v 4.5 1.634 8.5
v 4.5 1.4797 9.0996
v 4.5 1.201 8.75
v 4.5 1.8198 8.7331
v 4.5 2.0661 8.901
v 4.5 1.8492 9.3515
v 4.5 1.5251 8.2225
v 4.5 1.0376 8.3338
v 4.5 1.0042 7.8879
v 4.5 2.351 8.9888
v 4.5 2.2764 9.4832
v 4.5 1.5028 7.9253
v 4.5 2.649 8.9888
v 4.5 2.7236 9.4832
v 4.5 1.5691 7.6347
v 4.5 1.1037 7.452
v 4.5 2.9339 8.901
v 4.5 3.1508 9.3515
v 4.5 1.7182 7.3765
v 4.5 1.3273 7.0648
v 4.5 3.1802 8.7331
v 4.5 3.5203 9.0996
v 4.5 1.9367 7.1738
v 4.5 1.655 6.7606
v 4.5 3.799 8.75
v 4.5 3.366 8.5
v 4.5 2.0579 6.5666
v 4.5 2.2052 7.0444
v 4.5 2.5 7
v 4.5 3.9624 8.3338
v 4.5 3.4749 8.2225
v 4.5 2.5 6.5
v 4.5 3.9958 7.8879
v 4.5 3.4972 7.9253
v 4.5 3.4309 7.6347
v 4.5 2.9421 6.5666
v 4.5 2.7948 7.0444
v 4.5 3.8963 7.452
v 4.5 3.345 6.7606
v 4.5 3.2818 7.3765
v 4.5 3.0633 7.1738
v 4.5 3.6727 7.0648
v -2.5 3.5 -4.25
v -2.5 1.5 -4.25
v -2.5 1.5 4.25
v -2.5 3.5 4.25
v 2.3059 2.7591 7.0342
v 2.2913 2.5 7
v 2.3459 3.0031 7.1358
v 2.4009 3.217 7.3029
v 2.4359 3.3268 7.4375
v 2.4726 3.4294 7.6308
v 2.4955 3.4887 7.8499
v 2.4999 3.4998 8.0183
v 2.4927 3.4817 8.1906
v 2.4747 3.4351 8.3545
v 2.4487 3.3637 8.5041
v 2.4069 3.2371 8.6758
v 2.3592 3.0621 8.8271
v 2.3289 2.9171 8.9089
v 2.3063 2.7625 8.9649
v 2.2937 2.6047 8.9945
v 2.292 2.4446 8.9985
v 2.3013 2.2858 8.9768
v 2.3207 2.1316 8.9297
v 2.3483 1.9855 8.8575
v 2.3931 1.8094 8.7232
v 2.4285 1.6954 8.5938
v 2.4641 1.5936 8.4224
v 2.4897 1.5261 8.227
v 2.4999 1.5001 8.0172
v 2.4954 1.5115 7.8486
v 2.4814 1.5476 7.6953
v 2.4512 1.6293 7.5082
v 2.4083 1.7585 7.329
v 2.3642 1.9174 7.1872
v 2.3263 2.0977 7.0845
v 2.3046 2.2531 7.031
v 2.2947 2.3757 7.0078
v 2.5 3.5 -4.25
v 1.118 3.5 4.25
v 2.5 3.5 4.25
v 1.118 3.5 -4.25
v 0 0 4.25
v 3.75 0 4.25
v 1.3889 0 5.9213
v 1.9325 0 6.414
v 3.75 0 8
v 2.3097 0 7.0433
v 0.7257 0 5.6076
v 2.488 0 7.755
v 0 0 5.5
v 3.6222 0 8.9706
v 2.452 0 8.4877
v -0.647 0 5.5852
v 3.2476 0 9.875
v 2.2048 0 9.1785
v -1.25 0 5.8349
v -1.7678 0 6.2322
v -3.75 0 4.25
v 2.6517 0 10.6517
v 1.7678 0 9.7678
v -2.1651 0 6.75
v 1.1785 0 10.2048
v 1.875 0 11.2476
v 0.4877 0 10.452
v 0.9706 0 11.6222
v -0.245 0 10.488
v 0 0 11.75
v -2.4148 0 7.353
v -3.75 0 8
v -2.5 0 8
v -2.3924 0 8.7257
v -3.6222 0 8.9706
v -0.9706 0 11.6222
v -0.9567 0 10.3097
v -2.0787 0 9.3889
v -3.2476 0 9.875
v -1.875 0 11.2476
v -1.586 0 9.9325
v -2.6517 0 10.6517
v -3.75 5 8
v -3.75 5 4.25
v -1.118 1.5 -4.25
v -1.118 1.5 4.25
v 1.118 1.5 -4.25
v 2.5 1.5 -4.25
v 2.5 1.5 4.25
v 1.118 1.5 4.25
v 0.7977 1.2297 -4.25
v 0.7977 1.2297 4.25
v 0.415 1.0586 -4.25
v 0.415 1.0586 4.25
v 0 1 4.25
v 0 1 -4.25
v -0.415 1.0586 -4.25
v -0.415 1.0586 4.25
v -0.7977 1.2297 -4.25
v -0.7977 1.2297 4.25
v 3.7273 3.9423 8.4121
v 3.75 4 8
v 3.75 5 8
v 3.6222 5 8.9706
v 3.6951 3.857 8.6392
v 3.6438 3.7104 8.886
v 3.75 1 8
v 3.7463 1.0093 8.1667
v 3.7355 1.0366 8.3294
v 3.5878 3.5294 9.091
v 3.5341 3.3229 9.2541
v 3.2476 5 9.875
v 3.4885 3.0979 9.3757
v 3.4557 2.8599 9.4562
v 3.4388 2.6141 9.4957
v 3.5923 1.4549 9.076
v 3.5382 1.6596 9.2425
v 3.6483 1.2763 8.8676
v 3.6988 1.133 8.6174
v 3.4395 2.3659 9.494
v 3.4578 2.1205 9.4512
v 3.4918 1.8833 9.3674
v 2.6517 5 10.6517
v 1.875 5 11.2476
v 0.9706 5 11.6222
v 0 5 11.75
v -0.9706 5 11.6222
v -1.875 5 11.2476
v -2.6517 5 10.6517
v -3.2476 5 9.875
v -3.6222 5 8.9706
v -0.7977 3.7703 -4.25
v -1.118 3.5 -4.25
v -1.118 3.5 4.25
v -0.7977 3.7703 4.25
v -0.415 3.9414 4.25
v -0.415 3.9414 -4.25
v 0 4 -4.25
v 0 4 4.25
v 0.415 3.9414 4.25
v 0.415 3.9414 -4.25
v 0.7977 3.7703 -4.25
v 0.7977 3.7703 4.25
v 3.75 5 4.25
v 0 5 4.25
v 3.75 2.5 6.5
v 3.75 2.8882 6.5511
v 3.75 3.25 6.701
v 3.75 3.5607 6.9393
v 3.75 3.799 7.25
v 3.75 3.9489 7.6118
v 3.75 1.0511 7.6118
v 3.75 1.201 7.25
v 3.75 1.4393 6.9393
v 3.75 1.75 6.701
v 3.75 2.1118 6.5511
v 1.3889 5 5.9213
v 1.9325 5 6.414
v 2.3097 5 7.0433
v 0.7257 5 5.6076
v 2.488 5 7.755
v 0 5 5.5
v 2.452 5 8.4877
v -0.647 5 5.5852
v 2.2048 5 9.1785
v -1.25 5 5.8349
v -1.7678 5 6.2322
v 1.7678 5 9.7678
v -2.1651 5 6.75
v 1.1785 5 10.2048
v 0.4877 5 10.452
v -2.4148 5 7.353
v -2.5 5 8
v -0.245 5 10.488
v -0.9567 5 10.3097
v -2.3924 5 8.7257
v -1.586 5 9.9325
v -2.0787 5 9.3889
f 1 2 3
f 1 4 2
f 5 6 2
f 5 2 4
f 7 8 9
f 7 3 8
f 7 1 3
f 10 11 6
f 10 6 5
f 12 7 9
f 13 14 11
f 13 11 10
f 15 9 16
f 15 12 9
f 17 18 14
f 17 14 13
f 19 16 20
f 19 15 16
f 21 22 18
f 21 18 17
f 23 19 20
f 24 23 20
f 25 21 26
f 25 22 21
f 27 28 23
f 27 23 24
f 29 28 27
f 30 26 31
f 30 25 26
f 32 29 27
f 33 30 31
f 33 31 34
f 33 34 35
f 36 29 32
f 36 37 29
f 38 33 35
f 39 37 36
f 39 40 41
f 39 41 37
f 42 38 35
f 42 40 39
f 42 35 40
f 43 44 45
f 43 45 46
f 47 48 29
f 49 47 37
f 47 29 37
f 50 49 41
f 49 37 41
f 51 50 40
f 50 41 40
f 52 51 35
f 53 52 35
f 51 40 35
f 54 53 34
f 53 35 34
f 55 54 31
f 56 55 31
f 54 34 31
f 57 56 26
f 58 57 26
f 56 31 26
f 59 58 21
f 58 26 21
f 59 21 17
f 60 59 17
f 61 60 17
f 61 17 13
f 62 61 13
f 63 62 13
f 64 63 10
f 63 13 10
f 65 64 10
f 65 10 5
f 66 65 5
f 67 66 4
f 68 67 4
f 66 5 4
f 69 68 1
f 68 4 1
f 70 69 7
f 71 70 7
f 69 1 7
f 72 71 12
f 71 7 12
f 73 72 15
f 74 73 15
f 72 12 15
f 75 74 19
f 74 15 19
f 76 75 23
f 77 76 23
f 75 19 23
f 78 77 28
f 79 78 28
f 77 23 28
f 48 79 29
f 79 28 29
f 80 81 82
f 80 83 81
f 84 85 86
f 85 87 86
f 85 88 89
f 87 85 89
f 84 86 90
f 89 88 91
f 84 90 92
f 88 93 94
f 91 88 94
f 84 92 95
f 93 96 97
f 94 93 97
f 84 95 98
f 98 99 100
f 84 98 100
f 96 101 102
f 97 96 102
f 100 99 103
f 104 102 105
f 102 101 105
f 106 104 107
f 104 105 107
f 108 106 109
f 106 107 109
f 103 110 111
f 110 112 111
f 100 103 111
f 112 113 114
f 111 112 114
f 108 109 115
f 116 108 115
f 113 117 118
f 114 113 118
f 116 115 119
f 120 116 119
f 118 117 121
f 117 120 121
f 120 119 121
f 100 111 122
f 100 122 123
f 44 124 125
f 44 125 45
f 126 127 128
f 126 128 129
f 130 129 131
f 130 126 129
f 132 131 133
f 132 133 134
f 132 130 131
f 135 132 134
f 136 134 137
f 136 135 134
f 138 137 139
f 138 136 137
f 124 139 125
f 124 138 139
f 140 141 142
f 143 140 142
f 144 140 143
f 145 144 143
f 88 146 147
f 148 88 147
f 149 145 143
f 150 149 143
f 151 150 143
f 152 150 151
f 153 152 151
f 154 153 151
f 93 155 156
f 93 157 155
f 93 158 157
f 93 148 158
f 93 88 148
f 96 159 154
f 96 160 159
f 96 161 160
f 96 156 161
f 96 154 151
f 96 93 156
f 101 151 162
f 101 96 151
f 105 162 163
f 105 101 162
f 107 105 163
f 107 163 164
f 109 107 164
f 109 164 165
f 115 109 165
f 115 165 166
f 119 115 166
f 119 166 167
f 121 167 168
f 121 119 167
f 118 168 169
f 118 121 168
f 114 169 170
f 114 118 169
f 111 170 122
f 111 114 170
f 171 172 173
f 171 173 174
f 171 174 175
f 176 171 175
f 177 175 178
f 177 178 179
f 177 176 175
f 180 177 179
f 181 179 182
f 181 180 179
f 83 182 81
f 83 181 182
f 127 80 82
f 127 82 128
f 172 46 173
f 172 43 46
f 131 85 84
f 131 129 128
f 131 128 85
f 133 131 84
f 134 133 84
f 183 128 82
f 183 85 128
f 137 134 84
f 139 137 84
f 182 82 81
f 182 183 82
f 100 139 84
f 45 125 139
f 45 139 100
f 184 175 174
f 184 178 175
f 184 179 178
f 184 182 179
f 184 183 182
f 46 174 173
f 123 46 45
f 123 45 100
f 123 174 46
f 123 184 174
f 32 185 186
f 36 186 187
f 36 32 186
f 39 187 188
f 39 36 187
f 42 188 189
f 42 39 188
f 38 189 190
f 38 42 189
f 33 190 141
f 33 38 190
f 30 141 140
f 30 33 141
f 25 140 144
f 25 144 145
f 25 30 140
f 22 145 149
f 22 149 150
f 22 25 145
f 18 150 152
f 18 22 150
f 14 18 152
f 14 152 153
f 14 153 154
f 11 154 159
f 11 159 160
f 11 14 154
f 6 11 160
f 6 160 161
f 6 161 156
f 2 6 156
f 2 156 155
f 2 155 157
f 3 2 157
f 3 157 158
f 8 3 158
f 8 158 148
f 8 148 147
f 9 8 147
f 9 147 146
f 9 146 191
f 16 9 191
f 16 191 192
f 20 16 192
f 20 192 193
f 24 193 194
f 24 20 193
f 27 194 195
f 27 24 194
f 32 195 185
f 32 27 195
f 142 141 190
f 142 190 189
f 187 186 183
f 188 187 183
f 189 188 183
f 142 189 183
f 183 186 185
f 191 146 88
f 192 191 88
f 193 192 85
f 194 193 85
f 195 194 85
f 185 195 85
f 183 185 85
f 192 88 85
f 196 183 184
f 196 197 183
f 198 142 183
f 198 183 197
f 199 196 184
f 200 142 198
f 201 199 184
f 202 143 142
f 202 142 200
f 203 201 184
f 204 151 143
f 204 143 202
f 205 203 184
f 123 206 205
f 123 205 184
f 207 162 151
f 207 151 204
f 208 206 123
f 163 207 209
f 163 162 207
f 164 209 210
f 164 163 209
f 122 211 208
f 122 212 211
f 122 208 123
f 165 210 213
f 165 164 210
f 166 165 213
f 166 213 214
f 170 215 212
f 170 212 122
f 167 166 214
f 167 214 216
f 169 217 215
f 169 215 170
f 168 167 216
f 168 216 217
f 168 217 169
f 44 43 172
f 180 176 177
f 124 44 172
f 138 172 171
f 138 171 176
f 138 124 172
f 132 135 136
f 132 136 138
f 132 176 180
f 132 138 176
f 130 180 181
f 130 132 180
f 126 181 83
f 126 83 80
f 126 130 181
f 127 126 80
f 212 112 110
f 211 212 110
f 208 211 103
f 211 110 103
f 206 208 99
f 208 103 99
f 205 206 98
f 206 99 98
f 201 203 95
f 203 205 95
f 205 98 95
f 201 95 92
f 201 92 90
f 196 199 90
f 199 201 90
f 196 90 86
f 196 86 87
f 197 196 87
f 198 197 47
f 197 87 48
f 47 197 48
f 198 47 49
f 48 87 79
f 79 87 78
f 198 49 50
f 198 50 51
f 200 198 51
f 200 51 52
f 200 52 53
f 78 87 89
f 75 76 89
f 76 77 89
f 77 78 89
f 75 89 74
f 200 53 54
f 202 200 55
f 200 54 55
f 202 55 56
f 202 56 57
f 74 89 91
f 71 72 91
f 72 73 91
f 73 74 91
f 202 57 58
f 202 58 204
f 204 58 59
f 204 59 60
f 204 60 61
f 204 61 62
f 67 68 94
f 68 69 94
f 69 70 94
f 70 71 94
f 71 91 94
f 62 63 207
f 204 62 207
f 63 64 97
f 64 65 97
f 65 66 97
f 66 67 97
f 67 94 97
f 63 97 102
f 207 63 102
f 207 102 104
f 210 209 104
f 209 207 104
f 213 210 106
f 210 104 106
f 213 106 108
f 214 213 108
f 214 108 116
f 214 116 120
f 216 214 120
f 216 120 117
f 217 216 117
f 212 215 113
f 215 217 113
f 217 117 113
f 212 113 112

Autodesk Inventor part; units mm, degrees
ref_plane "YZ Plane" through (0, 0, 0) normal (1, 0, 0) x (0, 1, 0)
ref_plane "XZ Plane" through (0, 0, 0) normal (0, 1, 0) x (-1, 0, 0)
ref_plane "XY Plane" through (0, 0, 0) normal (0, 0, 1) x (1, 0, 0)
sketch "Sketch1" plane through (0, 0, 0) normal (0, 1, 0) x (-1, 0, 0)
  line L0 (0, 0) -> (0, -8)
  circle A0 centre (0, -8) radius 3
  line L1 (0, 0) -> (0, 8)
  circle A1 centre (0, 8) radius 2.5
  circle A2 centre (0, 8) radius 3.75
  circle A3 centre (0, -8) radius 3.75
  line L2 (3.75, 8) -> (3.75, -8)
  line L3 (-3.75, 8) -> (-3.75, -8)
  line L4 (3.75, 4.25) -> (-3.75, 4.25)
  line L5 (3.75, -4.25) -> (-3.75, -4.25)
  point P0 (-2.6582, -4.25)
  dimension "d0" = 8
  dimension "d1" = 6
  dimension "d2" = 8
  dimension "d3" = 5
  dimension "d4" = 7.5
  dimension "d5" = 7.5
  dimension "d6" = 8.5
extrude "Extrusion1" add sketch "Sketch1" along normal blind 5 contours L1 L4 L2 L5 L0 | L0 L5 L3 L4 L1 | L4 L3 A2 | A2 | A2 L2 L4
sketch "Sketch2" plane through (3.75, 0, -4.25) normal (0, 0, -1) x (-1, 0, 0)
  line L0 (0, 5) -> (7.5, 5) projected
  line L1 (0, 0) -> (7.5, 0)
  line L2 (7.5, 0) -> (7.5, 5)
  line L3 (7.5, 5) -> (0, 5)
  line L4 (0, 5) -> (0, 0)
  line L5 (0, 0) -> (7.5, 5) construction
  line L6 (7.5, 0) -> (0, 5) construction
  circle A0 centre (3.75, 2.5) radius 1.5
  line L7 (1.25, 1.5) -> (6.25, 1.5)
  line L8 (6.25, 1.5) -> (6.25, 3.5)
  line L9 (6.25, 3.5) -> (1.25, 3.5)
  line L10 (1.25, 3.5) -> (1.25, 1.5)
  line L11 (1.25, 1.5) -> (6.25, 3.5) construction
  line L12 (6.25, 1.5) -> (1.25, 3.5) construction
  point P0 (3.75, 0)
  point P1 (4.868, 1.5)
  point P2 (2.632, 1.5)
  point P3 (2.632, 3.5)
  point P4 (4.868, 3.5)
  dimension "d9" = 3
  dimension "d10" = 5
  dimension "d11" = 2
extrude "Extrusion2" cut sketch "Sketch2" against normal blind 8.5
sketch "Sketch3" plane through (3.75, 0, 8) normal (1, 0, 0) x (0, 0, -1)
  line L0 (0, 0) -> (0, 5) projected
  circle A0 centre (0, 2.5) radius 1.5
  point P0 (8, 0)
  dimension "d14" = 3
extrude "Extrusion3" add sketch "Sketch3" along normal mid plane 1.5
sketch "Sketch4" plane through (4.5, 2.5, 8) normal (1, 0, 0) x (0, 0, -1)
  line L0 (0, -2.5) -> (0, 2.5) projected
  circle A0 centre (0, 0) radius 1
  point P0 (8, -2.5)
  dimension "d17" = 2
extrude "Extrusion4" cut sketch "Sketch4" against normal blind 3.2625
properties part number "Link_InsideV3"
